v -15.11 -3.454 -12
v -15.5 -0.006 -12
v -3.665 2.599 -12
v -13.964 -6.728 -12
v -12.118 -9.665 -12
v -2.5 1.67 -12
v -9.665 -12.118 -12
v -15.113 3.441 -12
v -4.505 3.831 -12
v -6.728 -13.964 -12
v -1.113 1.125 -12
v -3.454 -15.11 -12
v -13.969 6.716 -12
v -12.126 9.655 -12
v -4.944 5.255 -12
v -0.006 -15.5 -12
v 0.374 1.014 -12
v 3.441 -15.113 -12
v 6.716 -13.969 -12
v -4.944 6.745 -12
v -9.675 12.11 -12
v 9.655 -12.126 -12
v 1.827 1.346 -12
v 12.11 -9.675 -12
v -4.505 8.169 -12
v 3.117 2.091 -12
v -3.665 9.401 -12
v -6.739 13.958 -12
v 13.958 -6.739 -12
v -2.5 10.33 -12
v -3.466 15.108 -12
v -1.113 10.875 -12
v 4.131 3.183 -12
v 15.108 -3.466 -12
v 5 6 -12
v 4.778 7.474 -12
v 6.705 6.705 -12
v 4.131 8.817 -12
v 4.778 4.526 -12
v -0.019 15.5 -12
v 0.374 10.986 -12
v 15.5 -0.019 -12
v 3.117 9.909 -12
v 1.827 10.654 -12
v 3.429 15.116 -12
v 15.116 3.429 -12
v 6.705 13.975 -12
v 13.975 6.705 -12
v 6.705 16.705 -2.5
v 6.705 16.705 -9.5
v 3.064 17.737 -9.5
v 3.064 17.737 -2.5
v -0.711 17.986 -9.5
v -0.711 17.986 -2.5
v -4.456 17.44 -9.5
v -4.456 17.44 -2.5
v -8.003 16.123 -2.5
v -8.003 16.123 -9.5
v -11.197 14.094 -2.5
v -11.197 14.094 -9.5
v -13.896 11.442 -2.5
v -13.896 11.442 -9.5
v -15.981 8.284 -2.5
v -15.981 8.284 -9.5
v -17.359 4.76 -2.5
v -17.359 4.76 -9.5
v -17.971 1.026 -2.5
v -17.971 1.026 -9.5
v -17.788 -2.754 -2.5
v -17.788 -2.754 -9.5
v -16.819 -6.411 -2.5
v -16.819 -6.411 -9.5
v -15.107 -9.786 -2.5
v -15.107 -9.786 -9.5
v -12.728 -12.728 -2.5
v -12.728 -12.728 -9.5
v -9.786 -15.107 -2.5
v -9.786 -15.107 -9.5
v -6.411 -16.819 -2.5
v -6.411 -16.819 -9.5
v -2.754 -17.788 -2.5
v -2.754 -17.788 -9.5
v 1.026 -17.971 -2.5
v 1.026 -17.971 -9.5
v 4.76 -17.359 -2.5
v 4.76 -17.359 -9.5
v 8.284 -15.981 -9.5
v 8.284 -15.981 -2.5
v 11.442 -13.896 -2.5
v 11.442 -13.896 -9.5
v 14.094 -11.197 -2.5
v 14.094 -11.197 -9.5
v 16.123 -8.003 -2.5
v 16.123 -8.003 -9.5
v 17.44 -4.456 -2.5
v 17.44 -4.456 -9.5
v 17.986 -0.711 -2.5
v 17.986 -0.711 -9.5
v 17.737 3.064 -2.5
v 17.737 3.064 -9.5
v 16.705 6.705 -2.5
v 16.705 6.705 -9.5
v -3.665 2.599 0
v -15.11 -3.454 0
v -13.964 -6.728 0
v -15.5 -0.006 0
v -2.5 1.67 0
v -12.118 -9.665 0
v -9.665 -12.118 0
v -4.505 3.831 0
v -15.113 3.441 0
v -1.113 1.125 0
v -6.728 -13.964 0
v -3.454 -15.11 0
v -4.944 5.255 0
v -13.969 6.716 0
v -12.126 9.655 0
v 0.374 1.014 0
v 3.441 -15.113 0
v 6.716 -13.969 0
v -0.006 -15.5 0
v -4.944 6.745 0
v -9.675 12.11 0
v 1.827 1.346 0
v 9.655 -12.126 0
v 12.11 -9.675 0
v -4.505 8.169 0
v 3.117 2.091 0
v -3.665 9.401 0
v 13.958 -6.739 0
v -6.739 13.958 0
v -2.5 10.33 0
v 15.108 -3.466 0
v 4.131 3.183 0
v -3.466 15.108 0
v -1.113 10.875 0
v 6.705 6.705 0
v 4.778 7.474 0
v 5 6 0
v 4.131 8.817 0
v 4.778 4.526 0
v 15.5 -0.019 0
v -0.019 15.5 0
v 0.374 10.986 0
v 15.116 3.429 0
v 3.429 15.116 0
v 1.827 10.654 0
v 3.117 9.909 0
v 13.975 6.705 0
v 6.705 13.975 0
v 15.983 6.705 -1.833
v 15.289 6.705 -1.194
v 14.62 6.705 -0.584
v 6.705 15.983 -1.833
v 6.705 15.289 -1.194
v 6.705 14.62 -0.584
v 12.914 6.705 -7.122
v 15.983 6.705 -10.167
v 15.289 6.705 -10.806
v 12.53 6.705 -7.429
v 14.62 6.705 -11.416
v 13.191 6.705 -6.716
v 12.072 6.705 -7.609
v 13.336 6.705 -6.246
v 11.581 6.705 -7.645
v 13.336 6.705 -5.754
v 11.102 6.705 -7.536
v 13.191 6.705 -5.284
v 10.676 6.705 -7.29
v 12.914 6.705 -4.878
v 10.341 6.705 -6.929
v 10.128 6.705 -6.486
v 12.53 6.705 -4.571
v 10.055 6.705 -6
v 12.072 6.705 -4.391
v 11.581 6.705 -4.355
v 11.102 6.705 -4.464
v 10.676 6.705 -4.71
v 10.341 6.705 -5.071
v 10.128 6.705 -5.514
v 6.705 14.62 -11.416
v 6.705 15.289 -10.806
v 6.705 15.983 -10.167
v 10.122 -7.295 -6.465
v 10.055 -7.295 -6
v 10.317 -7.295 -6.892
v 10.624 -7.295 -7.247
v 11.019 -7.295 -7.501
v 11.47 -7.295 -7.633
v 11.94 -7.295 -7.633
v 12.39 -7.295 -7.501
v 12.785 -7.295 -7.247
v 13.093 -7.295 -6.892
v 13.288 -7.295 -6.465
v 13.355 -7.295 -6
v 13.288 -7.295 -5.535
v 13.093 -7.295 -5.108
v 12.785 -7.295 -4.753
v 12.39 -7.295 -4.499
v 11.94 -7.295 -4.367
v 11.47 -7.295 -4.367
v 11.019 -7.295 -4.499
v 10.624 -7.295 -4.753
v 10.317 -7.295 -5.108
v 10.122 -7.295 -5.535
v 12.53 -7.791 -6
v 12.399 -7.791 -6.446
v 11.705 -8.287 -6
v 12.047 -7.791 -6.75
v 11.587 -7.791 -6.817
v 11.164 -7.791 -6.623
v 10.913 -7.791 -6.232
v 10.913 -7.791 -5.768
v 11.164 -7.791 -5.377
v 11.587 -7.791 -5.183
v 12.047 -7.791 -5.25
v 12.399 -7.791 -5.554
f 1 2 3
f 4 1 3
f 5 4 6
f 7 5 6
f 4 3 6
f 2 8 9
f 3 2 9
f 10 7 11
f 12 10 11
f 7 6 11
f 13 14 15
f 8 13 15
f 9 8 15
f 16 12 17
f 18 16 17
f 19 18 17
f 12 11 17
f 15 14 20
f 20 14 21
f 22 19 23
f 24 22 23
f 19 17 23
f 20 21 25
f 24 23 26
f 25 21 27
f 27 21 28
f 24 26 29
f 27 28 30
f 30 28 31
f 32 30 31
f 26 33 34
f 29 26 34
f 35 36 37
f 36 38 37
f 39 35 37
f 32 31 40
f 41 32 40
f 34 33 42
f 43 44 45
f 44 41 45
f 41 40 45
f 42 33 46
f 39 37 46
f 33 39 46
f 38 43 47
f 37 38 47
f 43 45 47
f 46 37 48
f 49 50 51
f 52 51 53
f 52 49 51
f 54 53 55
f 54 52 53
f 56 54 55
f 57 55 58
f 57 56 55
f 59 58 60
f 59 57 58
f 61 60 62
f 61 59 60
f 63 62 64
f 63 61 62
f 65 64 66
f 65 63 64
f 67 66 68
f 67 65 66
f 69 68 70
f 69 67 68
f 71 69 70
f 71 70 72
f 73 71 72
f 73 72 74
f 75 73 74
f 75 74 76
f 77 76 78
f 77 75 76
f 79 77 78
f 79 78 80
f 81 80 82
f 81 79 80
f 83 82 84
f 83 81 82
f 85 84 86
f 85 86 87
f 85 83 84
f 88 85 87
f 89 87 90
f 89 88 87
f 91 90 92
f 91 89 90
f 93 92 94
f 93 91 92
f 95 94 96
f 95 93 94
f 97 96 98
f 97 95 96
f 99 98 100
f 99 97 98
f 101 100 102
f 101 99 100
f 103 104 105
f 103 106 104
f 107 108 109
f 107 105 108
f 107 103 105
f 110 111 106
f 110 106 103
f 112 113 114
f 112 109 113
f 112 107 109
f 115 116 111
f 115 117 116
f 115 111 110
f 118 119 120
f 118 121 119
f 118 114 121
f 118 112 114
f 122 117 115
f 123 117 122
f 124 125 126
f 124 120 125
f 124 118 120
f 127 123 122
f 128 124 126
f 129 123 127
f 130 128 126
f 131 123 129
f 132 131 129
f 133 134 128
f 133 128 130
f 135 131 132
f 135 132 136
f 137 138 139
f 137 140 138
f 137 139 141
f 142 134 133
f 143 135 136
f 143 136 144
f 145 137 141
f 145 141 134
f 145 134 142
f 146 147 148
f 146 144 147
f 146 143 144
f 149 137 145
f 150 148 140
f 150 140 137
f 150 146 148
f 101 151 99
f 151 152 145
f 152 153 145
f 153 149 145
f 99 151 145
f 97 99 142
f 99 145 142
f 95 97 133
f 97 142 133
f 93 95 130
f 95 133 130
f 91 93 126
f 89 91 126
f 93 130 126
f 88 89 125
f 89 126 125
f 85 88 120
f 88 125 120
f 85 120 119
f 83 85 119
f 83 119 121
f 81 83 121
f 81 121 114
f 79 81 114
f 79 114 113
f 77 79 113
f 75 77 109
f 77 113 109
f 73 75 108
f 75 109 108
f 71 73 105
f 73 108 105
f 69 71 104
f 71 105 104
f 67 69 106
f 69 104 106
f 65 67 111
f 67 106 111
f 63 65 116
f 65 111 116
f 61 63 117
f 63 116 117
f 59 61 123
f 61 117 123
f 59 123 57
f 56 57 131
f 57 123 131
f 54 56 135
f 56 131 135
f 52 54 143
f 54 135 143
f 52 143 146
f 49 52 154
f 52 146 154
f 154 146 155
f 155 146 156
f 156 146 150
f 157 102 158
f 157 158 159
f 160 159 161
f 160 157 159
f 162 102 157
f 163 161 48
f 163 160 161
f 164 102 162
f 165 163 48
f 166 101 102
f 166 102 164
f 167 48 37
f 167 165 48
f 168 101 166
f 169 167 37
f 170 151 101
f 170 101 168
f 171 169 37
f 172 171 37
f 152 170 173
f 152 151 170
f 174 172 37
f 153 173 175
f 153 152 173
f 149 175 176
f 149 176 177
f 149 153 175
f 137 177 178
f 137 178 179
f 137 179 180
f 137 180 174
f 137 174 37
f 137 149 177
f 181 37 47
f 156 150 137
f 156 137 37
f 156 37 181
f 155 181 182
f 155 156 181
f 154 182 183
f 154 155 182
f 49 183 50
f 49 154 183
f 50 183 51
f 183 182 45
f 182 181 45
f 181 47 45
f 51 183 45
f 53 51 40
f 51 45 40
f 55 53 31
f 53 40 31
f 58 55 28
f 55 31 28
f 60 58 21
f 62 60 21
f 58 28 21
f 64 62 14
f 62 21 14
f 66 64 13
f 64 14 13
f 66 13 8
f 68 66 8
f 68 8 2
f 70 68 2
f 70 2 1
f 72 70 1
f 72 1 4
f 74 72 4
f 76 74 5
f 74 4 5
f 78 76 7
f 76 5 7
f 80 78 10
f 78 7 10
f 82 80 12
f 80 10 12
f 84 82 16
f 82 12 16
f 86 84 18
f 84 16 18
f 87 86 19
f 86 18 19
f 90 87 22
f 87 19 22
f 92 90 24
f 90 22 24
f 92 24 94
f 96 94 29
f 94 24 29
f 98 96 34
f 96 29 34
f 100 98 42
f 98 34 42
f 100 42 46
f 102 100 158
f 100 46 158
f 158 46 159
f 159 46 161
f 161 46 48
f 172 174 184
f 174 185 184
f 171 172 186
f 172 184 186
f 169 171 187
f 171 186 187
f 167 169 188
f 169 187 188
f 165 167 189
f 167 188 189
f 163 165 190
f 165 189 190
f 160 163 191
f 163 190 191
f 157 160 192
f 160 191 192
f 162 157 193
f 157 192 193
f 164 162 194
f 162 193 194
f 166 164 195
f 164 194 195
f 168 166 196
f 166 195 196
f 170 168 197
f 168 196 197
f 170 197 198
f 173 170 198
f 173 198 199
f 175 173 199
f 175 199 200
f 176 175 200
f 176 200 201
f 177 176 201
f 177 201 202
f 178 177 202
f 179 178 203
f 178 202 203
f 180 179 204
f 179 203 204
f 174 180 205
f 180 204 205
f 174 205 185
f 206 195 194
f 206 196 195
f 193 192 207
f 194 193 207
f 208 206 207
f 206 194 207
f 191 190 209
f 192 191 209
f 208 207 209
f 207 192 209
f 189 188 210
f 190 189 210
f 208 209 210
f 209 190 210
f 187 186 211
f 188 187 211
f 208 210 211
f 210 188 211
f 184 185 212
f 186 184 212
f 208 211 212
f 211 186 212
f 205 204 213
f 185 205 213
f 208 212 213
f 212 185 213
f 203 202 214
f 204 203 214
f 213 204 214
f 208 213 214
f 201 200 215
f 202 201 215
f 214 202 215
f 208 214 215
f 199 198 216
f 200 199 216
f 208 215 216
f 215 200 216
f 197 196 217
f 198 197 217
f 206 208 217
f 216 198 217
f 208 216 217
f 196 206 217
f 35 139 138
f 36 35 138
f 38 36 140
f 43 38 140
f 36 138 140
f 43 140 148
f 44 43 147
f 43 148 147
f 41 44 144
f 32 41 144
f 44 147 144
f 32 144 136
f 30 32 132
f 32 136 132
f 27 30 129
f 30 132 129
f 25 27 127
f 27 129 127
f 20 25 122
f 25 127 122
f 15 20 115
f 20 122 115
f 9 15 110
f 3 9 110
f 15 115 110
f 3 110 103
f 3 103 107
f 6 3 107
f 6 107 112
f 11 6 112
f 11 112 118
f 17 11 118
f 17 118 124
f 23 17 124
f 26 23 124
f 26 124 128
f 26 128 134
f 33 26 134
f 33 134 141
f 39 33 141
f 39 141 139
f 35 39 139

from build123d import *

# Parameters (mm, degrees)
SKETCH1_R             = 18
BOSS_EXTRUDE1_DEPTH   = 12
CUT_EXTRUDE4_DEPTH    = 17
SKETCH1_5_R           = 5
CUT_EXTRUDE5_DEPTH    = 22
M4_TAPPED_HOLE1_D     = 3.3
M4_TAPPED_HOLE1_DEPTH = 14
M4_TAPPED_HOLE1_TIP   = 0.991420021
CHAMFER1_SIZE         = 2.5
CHAMFER2_SIZE         = 2.5


with BuildPart() as part:
    # Sketch1 → Boss-Extrude1 (new body)
    with BuildSketch(Plane.XY):
        Circle(SKETCH1_R)
    extrude(amount=-BOSS_EXTRUDE1_DEPTH)

    # Sketch1<4> → Cut-Extrude4 (cut)
    with BuildSketch(Plane.XY):
        with BuildLine():
            Line((16.704699911, 6.704699911), (6.704699911, 6.704699911))
            Line((6.704699911, 6.704699911), (6.704699911, 16.704699911))
            ThreePointArc((6.704699911, 16.704699911), (12.727922061, 12.727922061), (16.704699911, 6.704699911))
        make_face()
    extrude(amount=-CUT_EXTRUDE4_DEPTH, mode=Mode.SUBTRACT)

    # Sketch1<5> → Cut-Extrude5 (cut)
    with BuildSketch(Plane.XY):
        with Locations((0, 6)):
            Circle(SKETCH1_5_R)
    extrude(amount=-CUT_EXTRUDE5_DEPTH, mode=Mode.SUBTRACT)

    # M4 Tapped Hole1
    with Locations(Plane(origin=(0, 6.704699911, 0), x_dir=(1, 0, 0), z_dir=(0, 1, 0))):
        with Locations((11.704699911, 6)):
            Hole(M4_TAPPED_HOLE1_D / 2, depth=M4_TAPPED_HOLE1_DEPTH)
            with Locations((0, 0, -(M4_TAPPED_HOLE1_DEPTH + M4_TAPPED_HOLE1_TIP / 2))):  # 118° drill point
                Cone(0, M4_TAPPED_HOLE1_D / 2, M4_TAPPED_HOLE1_TIP, mode=Mode.SUBTRACT)

    # Chamfer1
    chamfer1_edges = [part.edges().sort_by_distance(p)[0] for p in [
        (-12.727922061, -12.727922061, 0),
    ]]
    chamfer(chamfer1_edges, length=CHAMFER1_SIZE)

    # Chamfer2
    chamfer2_edges = [part.edges().sort_by_distance(p)[0] for p in [
        (-12.727922061, -12.727922061, -12),
    ]]
    chamfer(chamfer2_edges, length=CHAMFER2_SIZE)


solid = part.part
